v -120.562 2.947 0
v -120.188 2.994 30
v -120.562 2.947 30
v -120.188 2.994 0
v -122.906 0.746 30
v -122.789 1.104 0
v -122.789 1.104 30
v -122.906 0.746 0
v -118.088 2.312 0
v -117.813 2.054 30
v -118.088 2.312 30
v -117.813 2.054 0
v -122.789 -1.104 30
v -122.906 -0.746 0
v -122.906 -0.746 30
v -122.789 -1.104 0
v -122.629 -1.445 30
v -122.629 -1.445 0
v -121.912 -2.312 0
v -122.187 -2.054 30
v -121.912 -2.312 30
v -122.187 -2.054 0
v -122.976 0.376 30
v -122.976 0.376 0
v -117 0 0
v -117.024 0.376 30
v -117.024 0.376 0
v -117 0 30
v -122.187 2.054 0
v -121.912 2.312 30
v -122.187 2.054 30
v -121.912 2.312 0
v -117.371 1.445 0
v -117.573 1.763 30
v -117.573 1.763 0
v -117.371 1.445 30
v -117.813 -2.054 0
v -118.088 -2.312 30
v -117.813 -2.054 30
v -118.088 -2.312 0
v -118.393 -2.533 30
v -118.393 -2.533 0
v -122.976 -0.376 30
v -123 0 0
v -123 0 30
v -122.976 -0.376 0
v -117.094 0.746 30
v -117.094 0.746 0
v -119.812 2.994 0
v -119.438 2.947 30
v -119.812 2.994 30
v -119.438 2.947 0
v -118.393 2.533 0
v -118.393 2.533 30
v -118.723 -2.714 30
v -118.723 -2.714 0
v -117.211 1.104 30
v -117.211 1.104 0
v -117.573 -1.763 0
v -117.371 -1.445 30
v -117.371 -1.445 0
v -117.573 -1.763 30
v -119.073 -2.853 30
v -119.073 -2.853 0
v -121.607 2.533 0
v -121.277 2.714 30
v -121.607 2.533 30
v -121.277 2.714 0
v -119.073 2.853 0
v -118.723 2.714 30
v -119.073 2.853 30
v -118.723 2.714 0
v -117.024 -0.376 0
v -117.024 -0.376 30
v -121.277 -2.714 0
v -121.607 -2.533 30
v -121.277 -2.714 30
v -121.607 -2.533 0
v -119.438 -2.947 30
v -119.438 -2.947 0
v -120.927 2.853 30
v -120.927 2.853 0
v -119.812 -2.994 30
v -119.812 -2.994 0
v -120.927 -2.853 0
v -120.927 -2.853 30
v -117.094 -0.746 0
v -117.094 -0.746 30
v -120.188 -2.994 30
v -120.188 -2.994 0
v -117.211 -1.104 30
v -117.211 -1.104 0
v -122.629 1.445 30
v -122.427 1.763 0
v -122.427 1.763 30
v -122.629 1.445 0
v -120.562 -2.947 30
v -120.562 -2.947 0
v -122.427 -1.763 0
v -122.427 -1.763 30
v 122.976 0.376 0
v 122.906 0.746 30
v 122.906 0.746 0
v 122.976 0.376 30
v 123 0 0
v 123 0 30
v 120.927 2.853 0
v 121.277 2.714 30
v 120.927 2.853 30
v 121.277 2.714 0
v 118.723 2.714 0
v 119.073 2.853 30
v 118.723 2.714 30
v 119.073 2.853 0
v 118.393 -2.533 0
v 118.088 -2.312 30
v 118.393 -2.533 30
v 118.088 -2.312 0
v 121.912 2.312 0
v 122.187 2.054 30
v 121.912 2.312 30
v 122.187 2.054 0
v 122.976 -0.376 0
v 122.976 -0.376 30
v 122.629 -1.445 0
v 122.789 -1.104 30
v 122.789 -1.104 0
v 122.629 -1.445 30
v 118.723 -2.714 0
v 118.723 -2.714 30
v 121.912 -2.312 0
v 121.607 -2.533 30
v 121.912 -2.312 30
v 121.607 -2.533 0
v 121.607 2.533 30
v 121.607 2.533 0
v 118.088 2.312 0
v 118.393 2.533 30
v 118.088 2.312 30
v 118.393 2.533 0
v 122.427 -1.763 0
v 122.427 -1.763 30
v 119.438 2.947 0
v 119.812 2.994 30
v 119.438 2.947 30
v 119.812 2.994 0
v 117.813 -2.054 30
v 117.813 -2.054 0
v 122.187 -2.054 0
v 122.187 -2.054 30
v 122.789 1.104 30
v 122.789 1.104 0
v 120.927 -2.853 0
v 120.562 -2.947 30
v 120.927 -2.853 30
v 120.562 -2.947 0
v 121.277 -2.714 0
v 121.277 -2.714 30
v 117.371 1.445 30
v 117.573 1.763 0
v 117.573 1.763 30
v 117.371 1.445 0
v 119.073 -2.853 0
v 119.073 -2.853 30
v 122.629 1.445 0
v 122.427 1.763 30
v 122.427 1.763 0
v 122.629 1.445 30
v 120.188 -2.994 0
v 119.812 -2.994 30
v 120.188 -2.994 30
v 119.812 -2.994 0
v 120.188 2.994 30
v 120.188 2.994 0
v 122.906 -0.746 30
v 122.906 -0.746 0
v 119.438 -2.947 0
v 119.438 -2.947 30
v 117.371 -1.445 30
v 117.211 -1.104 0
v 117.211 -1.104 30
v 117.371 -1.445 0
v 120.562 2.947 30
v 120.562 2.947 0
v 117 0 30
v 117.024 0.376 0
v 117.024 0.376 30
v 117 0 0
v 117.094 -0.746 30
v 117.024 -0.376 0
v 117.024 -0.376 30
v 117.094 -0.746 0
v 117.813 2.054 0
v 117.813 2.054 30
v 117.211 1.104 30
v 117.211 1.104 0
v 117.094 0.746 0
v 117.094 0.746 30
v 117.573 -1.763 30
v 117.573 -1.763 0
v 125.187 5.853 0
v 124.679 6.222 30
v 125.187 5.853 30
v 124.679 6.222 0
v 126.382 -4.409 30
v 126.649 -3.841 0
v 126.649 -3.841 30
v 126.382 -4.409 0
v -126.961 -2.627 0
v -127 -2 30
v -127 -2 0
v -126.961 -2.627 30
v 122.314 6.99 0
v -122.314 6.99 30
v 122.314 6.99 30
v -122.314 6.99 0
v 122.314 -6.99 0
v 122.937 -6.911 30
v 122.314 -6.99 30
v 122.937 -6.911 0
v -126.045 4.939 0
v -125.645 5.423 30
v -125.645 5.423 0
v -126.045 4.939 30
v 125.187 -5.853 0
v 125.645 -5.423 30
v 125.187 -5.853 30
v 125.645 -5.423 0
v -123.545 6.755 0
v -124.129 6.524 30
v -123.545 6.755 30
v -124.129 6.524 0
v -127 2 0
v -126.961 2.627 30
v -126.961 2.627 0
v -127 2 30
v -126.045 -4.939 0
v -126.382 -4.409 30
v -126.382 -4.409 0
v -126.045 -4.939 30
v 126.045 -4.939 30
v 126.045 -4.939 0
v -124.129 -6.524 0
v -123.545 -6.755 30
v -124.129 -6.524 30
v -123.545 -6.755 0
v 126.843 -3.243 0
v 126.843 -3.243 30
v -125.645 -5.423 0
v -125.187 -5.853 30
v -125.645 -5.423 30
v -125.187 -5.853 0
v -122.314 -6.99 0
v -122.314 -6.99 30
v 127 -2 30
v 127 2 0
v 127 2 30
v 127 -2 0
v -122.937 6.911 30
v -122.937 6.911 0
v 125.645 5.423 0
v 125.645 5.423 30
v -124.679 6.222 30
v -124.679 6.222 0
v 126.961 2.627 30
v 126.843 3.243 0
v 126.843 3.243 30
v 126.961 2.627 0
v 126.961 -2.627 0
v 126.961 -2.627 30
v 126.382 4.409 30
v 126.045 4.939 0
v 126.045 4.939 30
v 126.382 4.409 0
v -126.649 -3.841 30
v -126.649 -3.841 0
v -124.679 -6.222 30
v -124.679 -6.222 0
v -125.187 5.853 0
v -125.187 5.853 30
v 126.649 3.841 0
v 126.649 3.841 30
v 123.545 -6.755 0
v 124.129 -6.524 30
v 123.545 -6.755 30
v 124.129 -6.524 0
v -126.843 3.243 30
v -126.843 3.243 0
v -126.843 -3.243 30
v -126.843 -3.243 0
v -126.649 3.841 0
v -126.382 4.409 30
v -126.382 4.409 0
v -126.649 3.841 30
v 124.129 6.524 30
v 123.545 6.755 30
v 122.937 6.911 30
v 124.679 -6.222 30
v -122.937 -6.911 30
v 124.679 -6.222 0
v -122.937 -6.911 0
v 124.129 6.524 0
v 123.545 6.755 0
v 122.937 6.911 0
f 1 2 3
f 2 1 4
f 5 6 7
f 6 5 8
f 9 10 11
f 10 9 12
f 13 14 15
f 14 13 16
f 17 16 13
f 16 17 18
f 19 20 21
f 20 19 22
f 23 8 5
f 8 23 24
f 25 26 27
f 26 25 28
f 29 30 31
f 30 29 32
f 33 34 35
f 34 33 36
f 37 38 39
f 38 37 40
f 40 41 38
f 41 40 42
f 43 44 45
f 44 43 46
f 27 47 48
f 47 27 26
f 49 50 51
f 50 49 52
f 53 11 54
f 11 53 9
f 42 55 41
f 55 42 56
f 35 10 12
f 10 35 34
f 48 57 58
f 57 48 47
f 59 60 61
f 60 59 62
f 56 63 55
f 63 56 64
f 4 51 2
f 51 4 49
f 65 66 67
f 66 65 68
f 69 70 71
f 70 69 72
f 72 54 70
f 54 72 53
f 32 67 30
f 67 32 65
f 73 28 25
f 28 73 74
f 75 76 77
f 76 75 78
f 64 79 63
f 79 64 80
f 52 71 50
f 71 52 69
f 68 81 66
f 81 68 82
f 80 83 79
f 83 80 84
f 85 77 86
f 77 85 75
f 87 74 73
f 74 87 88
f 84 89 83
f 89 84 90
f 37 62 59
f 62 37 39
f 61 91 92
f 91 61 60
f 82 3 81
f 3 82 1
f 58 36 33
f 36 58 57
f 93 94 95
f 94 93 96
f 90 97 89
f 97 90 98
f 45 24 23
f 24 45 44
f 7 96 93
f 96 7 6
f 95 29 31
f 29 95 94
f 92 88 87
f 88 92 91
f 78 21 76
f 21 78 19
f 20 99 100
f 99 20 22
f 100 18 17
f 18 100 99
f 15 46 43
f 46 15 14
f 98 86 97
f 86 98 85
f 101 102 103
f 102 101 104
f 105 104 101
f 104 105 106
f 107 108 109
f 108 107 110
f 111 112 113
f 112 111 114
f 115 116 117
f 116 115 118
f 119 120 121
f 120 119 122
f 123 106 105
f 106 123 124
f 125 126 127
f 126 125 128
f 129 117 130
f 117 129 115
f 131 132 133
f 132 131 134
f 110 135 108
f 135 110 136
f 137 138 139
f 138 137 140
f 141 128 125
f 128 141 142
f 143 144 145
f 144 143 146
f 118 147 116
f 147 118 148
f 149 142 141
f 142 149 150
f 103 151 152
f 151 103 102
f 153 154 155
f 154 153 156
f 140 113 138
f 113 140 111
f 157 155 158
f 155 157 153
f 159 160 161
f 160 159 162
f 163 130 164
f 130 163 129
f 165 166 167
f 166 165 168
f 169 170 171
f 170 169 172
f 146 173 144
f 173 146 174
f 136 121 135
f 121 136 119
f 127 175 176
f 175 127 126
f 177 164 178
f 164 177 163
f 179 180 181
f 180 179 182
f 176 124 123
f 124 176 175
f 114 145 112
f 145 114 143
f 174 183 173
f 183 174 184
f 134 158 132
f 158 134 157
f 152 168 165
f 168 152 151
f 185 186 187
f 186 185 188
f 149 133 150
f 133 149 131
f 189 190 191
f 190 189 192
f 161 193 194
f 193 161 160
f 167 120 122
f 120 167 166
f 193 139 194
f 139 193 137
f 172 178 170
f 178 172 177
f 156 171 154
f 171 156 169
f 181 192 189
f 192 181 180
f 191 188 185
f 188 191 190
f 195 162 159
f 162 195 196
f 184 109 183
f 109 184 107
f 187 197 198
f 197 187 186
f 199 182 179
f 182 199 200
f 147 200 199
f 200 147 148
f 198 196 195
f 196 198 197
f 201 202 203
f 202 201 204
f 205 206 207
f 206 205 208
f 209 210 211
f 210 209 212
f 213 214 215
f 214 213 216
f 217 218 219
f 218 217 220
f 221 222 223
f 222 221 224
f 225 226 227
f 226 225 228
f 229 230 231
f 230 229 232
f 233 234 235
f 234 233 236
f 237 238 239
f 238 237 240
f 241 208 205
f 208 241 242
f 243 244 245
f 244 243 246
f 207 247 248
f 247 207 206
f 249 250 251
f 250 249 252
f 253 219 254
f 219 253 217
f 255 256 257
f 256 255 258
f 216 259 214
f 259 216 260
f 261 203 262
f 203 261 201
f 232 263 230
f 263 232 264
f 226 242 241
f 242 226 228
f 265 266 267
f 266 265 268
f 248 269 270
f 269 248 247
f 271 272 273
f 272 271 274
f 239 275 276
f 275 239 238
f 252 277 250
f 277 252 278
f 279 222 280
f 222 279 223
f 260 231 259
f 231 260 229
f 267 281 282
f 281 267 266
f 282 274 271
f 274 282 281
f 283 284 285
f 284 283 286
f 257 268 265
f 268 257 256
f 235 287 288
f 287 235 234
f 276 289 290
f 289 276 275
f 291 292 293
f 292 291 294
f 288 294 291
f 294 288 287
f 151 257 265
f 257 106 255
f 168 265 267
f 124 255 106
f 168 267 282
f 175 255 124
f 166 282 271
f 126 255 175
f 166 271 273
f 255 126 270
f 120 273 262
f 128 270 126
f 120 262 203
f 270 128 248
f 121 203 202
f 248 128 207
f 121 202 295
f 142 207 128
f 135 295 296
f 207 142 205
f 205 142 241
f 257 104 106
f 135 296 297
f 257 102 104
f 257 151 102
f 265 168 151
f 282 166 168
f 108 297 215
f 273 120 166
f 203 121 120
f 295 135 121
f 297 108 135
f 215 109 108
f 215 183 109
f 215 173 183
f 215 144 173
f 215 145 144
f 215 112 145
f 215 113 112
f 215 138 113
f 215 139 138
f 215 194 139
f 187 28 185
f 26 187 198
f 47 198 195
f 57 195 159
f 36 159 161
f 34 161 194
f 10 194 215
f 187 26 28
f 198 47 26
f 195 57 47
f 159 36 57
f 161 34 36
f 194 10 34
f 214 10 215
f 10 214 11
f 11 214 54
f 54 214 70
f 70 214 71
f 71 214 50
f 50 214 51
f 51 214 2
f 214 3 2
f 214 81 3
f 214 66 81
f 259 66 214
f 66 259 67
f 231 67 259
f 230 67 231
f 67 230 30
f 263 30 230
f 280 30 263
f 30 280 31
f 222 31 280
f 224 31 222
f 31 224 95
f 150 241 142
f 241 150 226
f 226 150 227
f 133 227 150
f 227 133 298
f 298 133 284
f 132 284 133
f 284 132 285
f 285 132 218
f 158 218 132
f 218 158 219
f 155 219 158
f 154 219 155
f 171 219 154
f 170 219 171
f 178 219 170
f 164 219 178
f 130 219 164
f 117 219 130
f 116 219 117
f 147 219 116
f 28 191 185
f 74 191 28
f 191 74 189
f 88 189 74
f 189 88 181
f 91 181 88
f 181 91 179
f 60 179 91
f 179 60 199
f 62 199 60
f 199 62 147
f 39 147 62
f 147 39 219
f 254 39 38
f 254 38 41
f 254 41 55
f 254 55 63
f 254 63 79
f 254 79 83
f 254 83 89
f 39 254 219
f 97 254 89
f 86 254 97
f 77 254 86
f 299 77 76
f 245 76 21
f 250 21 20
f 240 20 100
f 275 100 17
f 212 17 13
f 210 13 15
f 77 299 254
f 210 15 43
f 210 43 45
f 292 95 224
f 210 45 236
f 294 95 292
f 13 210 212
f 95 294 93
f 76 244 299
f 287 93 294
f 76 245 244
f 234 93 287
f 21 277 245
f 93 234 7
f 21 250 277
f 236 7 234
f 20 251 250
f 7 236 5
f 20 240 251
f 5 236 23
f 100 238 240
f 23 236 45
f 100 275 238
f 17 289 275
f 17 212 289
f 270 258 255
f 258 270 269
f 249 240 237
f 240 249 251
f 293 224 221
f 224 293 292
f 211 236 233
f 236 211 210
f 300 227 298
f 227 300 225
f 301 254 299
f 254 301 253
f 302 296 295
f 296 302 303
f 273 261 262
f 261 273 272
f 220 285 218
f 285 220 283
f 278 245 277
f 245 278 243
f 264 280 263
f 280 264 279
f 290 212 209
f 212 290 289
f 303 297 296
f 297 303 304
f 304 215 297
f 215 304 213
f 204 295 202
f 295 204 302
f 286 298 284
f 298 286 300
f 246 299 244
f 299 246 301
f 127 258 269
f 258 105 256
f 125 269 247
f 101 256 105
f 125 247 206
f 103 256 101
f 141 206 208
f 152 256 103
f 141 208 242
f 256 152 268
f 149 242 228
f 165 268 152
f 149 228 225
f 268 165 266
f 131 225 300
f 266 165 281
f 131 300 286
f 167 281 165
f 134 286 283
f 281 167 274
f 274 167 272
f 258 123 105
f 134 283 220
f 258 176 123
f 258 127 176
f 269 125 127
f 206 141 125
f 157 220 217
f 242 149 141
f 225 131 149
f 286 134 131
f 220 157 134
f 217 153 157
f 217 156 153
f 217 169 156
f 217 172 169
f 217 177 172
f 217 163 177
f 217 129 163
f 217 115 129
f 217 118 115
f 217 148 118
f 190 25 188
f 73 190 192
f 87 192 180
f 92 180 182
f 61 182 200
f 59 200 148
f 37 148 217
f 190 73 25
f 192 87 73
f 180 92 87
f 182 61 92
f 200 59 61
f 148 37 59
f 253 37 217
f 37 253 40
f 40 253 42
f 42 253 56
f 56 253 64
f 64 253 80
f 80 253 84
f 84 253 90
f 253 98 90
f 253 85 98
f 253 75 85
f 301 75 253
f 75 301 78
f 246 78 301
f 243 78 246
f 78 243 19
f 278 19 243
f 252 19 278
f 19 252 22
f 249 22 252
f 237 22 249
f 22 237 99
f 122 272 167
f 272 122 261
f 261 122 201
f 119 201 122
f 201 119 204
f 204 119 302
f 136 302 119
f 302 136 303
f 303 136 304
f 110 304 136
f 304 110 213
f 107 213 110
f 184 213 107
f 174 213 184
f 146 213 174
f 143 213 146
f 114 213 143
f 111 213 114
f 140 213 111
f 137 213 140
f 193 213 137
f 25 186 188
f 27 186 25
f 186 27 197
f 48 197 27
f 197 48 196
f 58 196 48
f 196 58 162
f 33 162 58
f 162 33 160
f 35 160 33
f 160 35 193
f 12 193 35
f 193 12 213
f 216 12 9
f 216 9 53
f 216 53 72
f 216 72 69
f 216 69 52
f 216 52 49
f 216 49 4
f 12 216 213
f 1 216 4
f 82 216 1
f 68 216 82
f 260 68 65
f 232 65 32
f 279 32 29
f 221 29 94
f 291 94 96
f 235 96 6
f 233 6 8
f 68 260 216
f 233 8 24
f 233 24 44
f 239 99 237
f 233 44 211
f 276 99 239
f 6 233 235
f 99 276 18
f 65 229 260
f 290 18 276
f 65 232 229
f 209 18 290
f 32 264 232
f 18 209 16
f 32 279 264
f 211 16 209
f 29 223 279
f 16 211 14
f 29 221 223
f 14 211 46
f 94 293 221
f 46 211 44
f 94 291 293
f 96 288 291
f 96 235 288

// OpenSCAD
$fn = 50;


difference() {
	union() {
		hull() {
			translate(v = [-122.0000000000, 2.0000000000, 0]) {
				cylinder(h = 30, r = 5);
			}
			translate(v = [122.0000000000, 2.0000000000, 0]) {
				cylinder(h = 30, r = 5);
			}
			translate(v = [-122.0000000000, -2.0000000000, 0]) {
				cylinder(h = 30, r = 5);
			}
			translate(v = [122.0000000000, -2.0000000000, 0]) {
				cylinder(h = 30, r = 5);
			}
		}
	}
	union() {
		translate(v = [-120.0000000000, 0.0000000000, -100.0000000000]) {
			cylinder(h = 200, r = 3.0000000000);
		}
		translate(v = [-120.0000000000, 0.0000000000, -100.0000000000]) {
			cylinder(h = 200, r = 3.0000000000);
		}
		translate(v = [120.0000000000, 0.0000000000, -100.0000000000]) {
			cylinder(h = 200, r = 3.0000000000);
		}
		translate(v = [120.0000000000, 0.0000000000, -100.0000000000]) {
			cylinder(h = 200, r = 3.0000000000);
		}
	}
}
